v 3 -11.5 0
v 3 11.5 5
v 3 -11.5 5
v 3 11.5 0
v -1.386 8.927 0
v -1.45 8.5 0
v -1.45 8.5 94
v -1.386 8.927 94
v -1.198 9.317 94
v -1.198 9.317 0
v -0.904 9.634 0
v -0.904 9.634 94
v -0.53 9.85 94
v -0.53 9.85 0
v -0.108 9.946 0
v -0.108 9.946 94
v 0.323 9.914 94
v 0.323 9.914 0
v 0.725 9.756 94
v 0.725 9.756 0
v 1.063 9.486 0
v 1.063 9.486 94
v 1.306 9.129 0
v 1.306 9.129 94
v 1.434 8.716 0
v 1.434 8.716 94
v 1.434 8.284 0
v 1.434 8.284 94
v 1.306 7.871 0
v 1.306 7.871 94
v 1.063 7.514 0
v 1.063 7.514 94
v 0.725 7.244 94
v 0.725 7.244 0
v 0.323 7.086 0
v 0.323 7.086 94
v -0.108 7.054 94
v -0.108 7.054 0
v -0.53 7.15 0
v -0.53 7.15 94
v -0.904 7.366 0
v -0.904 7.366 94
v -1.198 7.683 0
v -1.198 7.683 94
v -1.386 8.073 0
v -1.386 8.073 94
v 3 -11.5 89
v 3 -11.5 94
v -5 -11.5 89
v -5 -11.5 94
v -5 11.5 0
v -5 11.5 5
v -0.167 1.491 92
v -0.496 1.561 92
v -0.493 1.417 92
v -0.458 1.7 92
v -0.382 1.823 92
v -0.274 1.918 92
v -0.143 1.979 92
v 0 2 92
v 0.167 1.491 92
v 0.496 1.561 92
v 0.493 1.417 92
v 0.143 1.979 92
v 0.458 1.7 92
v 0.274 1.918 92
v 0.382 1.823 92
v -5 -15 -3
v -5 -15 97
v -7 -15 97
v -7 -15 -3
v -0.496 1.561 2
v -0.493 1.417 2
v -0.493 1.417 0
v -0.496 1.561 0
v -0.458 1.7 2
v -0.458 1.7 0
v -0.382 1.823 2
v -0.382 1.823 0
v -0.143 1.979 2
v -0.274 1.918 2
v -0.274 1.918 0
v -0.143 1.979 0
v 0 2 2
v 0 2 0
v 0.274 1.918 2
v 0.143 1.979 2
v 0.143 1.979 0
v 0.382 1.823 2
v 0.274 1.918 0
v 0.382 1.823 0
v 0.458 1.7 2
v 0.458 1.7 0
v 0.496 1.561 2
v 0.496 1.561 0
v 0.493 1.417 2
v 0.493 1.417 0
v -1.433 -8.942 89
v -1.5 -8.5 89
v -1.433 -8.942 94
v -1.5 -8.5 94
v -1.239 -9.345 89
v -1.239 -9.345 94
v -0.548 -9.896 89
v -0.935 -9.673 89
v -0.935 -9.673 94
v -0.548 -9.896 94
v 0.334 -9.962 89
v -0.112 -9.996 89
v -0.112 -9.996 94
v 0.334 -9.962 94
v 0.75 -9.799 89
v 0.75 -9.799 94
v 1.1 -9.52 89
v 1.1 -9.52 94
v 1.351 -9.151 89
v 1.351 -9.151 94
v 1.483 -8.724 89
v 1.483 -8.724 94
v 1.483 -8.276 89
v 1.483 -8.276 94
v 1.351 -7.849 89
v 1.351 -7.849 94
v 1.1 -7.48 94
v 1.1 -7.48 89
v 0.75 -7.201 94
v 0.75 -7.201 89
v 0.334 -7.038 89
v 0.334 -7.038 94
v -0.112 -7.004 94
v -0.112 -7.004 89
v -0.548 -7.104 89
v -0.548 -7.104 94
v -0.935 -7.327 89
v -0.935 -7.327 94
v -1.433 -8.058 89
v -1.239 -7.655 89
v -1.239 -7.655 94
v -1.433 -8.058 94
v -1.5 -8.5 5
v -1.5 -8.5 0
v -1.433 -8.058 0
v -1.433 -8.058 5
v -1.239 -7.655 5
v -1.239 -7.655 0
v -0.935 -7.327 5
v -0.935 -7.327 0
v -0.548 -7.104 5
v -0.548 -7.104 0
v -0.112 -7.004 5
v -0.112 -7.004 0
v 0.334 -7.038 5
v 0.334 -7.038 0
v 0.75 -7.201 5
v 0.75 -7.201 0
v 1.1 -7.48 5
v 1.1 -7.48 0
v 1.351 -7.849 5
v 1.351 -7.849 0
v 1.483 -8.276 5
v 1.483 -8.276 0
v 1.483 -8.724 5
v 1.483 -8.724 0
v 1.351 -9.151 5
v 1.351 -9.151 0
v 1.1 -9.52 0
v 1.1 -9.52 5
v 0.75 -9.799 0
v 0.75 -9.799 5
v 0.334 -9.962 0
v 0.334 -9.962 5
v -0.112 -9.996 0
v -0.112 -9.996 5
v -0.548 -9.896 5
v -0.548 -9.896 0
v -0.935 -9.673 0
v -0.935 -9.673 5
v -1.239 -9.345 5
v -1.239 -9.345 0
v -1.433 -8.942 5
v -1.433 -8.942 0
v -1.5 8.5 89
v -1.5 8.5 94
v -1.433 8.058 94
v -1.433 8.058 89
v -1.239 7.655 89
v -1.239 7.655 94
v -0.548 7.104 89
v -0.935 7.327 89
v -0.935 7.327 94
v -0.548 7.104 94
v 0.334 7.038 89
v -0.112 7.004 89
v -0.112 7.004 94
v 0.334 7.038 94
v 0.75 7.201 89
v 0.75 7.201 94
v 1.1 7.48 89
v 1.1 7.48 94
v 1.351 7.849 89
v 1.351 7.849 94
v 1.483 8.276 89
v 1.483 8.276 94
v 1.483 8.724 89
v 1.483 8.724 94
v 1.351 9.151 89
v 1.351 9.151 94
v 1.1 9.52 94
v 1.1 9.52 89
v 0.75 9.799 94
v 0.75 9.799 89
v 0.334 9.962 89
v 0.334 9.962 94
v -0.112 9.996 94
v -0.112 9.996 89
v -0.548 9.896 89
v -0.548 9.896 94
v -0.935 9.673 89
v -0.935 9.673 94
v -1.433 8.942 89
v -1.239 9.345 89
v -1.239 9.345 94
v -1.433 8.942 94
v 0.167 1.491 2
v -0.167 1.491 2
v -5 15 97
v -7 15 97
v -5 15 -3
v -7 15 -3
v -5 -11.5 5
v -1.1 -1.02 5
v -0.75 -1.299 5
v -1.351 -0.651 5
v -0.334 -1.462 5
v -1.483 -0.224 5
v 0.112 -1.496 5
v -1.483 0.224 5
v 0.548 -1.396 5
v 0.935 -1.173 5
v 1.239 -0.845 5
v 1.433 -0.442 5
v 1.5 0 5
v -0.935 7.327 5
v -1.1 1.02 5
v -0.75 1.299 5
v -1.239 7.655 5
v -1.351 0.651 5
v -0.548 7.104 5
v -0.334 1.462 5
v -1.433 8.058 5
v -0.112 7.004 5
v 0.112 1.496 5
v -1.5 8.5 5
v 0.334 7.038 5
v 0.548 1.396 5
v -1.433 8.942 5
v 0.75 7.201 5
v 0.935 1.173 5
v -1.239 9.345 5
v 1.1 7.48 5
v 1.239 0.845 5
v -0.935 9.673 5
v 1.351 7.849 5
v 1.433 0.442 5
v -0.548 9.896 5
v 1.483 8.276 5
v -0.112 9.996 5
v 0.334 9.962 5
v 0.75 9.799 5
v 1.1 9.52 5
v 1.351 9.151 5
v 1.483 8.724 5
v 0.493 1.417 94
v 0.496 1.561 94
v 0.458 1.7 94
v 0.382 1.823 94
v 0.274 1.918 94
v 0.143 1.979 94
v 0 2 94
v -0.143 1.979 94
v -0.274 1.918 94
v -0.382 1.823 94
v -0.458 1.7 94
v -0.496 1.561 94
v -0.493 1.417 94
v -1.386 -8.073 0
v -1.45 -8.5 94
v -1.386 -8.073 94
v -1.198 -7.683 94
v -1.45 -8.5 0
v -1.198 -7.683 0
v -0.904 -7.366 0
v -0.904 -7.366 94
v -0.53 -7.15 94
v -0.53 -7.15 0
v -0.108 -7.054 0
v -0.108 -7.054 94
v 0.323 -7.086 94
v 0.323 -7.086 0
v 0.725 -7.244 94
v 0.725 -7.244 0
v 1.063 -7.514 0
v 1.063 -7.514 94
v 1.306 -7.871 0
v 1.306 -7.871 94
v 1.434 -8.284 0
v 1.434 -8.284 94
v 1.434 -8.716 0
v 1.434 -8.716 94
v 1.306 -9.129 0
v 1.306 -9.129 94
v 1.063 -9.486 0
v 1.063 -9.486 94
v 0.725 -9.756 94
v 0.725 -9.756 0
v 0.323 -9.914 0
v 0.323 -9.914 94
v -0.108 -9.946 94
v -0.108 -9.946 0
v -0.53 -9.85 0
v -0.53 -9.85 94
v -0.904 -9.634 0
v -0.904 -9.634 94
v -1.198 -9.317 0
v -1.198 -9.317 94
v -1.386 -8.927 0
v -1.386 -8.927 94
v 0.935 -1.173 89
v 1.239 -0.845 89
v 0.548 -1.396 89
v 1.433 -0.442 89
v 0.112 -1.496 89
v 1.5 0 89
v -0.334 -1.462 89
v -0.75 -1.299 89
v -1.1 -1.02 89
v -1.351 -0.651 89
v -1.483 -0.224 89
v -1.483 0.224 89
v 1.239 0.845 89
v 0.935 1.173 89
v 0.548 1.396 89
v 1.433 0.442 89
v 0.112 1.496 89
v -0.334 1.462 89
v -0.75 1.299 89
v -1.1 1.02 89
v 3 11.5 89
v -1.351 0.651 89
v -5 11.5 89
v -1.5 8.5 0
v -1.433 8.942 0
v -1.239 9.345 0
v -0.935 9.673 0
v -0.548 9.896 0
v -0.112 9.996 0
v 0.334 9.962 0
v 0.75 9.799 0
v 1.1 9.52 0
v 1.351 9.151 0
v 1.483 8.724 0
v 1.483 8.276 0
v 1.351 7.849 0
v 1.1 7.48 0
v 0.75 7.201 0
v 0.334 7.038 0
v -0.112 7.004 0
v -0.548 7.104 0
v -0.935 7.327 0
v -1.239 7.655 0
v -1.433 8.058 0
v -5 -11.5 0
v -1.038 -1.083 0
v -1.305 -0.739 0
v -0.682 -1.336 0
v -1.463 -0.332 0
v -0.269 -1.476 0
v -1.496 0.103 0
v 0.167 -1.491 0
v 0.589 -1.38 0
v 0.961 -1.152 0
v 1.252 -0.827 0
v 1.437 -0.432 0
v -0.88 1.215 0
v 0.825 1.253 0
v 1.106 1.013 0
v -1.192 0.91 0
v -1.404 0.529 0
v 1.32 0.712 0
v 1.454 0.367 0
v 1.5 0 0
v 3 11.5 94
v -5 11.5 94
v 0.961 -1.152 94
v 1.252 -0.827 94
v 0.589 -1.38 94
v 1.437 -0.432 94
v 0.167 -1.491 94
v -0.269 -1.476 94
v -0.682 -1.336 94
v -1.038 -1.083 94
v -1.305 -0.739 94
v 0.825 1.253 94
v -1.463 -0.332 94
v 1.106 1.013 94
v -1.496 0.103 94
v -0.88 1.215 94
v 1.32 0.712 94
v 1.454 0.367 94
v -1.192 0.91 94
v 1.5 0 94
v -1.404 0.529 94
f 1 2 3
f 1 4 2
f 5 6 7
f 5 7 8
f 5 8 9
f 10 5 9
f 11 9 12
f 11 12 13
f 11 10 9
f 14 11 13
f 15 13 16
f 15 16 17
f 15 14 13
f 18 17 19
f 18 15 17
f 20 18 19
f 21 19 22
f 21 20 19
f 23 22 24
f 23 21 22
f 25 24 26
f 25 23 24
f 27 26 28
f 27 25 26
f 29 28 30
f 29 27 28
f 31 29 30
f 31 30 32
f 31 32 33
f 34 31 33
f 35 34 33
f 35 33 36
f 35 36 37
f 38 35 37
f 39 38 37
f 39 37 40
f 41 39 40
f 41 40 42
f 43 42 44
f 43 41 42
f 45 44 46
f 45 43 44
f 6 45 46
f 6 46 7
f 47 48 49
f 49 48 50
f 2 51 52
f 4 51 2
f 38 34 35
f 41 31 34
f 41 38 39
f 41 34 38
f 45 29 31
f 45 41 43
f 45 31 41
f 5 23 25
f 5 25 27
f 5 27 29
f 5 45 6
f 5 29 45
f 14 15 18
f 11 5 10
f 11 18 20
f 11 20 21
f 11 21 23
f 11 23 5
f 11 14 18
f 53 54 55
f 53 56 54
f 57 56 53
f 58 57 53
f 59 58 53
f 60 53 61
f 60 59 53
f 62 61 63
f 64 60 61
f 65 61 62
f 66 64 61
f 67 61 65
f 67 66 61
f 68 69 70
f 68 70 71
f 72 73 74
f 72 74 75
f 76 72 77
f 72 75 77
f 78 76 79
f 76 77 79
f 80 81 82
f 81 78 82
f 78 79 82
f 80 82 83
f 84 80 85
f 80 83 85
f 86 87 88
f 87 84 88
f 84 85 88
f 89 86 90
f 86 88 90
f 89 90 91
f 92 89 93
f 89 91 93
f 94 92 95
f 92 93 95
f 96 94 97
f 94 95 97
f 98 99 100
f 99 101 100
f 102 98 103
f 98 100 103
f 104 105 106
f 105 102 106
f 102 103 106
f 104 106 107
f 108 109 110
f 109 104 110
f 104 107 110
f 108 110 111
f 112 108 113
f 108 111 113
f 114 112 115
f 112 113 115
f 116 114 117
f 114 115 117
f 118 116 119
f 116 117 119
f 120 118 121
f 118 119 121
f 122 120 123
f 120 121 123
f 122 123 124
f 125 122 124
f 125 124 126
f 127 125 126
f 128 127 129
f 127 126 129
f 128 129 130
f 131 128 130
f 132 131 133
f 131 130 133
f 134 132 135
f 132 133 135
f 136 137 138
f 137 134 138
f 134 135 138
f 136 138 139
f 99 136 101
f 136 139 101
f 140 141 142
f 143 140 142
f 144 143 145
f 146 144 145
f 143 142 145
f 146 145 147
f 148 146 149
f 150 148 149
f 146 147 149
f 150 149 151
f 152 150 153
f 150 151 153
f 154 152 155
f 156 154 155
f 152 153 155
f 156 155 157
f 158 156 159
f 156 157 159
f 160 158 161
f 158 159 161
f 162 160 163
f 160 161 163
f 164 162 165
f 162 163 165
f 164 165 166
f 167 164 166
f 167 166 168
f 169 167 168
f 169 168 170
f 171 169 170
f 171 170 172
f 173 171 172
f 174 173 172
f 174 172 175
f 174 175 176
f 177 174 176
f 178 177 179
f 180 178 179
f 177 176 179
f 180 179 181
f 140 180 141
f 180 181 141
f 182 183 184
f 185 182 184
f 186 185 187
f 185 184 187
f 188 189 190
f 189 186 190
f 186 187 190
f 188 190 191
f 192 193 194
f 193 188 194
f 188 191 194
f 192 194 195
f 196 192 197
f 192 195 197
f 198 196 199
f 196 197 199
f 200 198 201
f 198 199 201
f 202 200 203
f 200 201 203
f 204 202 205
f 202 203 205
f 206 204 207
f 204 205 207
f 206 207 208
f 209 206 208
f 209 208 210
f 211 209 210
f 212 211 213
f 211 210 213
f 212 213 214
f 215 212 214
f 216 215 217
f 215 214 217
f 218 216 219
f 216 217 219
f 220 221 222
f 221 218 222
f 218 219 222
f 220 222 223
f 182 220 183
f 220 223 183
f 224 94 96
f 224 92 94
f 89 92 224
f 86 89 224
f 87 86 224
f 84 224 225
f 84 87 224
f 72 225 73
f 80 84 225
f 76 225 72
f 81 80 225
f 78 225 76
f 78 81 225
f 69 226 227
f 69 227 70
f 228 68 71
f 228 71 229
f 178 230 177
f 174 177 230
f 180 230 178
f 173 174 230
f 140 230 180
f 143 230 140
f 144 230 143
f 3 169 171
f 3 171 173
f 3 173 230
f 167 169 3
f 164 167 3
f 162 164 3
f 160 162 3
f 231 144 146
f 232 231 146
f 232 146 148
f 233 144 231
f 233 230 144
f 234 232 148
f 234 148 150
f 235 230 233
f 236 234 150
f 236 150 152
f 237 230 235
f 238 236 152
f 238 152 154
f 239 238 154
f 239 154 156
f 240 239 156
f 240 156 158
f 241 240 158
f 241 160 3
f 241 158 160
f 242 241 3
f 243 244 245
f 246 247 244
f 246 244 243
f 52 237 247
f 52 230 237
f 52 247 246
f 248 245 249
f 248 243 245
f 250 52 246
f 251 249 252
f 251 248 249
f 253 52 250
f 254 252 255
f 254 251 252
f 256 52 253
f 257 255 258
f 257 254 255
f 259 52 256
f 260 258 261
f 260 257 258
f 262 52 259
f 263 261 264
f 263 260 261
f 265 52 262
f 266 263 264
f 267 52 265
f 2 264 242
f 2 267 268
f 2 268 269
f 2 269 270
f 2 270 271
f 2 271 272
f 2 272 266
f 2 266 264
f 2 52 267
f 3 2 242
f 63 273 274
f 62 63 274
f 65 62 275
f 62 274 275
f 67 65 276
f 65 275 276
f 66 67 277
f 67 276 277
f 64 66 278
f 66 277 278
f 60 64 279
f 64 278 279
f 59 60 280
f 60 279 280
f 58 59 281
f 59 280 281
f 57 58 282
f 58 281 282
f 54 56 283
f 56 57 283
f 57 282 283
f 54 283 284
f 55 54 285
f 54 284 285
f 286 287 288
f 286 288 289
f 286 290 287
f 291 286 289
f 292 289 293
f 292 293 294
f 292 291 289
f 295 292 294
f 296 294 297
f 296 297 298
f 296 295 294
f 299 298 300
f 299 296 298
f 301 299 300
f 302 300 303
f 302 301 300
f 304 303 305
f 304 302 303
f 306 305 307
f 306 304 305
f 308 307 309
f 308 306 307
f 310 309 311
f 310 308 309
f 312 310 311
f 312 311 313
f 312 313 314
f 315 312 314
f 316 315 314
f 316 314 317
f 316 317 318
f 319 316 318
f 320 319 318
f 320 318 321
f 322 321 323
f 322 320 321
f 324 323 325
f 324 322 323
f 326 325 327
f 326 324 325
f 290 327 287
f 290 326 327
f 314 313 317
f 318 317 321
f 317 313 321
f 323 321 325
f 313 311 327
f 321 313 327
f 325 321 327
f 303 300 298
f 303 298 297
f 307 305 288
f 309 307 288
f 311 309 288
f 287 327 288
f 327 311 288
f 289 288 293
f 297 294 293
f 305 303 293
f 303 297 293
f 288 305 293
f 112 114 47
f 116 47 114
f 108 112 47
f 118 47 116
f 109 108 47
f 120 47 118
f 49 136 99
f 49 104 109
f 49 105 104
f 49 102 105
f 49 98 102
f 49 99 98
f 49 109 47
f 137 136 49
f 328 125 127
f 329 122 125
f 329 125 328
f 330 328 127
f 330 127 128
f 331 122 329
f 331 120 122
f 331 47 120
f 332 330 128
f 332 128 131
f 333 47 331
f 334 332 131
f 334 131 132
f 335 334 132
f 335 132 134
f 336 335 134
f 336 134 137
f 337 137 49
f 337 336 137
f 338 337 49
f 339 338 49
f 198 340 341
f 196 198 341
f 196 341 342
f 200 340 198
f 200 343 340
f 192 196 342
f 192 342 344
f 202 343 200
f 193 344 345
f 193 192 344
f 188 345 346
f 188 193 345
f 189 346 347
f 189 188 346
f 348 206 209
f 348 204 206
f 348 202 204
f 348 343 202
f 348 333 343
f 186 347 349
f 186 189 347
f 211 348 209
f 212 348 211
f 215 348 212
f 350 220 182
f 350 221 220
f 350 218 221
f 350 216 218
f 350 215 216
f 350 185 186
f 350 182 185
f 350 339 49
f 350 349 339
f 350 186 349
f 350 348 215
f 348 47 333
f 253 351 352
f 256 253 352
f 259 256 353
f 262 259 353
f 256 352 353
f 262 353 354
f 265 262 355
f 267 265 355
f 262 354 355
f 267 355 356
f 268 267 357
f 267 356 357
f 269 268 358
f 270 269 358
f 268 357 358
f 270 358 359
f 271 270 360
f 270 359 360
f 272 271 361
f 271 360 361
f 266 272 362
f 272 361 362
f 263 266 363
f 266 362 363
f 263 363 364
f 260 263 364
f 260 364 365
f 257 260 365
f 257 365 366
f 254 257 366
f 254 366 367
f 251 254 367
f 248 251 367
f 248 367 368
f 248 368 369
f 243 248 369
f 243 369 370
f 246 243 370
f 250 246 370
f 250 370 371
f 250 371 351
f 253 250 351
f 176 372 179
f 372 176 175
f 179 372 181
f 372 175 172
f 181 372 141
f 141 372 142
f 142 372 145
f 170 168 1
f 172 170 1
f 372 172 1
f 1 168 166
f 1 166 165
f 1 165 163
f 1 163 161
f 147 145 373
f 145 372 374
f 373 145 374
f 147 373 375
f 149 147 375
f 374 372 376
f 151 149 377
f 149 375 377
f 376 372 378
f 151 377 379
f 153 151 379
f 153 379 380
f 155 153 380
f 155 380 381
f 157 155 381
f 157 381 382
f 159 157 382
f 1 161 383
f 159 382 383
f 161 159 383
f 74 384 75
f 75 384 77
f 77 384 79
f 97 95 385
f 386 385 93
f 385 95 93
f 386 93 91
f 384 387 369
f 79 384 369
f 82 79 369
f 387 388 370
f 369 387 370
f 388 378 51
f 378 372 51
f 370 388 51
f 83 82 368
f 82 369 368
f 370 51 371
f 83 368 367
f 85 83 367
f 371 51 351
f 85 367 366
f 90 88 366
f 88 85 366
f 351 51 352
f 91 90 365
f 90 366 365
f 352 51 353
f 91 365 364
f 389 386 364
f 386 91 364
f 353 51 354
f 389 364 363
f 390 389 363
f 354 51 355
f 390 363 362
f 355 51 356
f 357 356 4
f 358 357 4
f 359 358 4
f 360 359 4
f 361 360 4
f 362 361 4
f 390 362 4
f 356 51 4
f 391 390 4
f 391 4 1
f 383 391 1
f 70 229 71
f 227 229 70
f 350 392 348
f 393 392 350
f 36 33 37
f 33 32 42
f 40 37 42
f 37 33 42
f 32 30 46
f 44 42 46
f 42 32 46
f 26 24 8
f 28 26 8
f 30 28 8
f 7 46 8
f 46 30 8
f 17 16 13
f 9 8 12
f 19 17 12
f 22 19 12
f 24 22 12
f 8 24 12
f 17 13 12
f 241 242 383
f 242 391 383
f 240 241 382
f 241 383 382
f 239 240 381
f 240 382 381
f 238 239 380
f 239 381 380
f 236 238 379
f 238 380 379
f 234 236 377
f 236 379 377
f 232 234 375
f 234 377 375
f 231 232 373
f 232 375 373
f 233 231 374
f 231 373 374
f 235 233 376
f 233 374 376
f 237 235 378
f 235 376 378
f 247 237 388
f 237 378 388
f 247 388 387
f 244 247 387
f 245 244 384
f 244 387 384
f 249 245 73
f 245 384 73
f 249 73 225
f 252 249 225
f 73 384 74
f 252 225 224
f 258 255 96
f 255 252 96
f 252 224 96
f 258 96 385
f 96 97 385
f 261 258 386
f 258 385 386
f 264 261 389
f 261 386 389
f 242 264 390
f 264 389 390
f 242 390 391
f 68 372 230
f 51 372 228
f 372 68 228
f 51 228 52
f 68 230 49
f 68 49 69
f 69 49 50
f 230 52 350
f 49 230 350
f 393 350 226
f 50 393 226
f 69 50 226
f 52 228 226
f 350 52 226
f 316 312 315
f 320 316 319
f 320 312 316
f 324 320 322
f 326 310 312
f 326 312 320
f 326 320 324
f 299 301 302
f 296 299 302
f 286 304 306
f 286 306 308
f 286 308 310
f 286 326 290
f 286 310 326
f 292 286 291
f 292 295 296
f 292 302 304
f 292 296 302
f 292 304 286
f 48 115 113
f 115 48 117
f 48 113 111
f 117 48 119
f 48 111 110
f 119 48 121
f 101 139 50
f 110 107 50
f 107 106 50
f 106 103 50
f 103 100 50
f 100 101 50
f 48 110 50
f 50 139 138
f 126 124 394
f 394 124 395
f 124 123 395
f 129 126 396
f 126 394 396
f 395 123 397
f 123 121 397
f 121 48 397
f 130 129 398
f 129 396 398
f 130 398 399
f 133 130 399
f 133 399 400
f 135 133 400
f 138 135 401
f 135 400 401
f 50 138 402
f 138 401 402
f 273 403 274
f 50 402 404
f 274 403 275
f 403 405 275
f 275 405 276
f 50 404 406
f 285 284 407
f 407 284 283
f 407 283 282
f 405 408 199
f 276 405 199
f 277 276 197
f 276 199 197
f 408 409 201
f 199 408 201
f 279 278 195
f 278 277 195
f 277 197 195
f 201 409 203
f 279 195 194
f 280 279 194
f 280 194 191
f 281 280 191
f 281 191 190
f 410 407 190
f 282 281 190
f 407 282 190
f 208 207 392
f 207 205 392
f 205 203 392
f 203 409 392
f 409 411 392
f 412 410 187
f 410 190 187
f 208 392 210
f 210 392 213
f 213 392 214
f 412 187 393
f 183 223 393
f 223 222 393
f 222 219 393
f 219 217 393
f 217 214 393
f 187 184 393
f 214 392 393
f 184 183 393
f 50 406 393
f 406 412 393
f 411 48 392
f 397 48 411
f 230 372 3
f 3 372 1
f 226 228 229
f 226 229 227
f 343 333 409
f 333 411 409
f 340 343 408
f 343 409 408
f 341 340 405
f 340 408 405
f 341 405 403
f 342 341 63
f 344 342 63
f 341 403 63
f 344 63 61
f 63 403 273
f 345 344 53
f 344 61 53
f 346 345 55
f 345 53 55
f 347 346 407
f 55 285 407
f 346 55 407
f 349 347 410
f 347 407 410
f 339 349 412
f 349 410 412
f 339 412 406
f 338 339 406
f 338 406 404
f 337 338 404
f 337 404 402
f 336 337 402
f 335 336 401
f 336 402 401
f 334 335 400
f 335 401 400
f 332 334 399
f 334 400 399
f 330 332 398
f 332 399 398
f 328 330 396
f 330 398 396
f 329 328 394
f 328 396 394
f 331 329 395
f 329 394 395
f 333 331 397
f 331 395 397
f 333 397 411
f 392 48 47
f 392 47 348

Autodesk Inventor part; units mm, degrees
ref_plane "YZ Plane" through (0, 0, 0) normal (1, 0, 0) x (0, 1, 0)
ref_plane "XZ Plane" through (0, 0, 0) normal (0, 1, 0) x (-1, 0, 0)
sketch "Sketch1" plane through (0, 0, 0) normal (0, 0, 1) x (1, 0, 0)
  circle A0 centre (0, 0) radius 1.5
  line L0 (3, 3) -> (3, -3)
  line L1 (3, -3) -> (-3, -3)
  line L2 (-3, -3) -> (-3, 3)
  line L3 (-3, 3) -> (3, 3)
  dimension "d0" = 3
  dimension "d1" = 6
extrude "Extrusion1" add sketch "Sketch1" along normal blind 5
sketch "Sketch13" plane through (0, 0, 0) normal (0, 0, -1) x (-1, 0, 0)
  circle A0 centre (0, 0) radius 1.5 projected
  line L0 (3, 3) -> (-3, 3) projected
  line L1 (0, 0) -> (0, 1.5)
  circle A1 centre (0, 1.5) radius 0.5
  dimension "d63" = 1
extrude "Extrusion11" cut sketch "Sketch13" against normal blind 2 contours A1 L1 A0 | A0 A1 | A0 L1 A1 picked at (-0.1081, 1.6551)
thread "Thread2" size "M1x0.25" class "6H" standard "ANSI Metric M Profile" full length
ref_plane "Work Plane3" through (0, 0, 47) normal (0, 0, 1) x (1, 0, 0)
sketch "Sketch15" plane through (0, 0, 0) normal (0, 0, -1) x (-1, 0, 0)
  line L0 (-3, 3) -> (-3, -3) projected
  line L1 (3, -3) -> (3, 3) projected
  line L2 (3, 3) -> (-3, 3) projected
  arc A0 (-0.493, 1.4167) -> (0.493, 1.4167) centre (0, 0) ccw projected
  line L3 (0, 0) -> (0, 3) construction
  line L4 (0, 0) -> (0, 8.5) construction
  circle A1 centre (0, 8.5) radius 1.5
  line L5 (-3, 3) -> (3, 3)
  line L6 (3, 3) -> (3, 11.5)
  line L7 (3, 11.5) -> (-3, 11.5)
  line L8 (-3, 11.5) -> (-3, 3)
  line L9 (-3, 0) -> (3, 0) construction
  line L10 (3, -3) -> (-3, -3)
  circle A2 centre (0, -8.5) radius 1.5
  line L11 (-3, -3) -> (3, -3)
  line L12 (3, -3) -> (3, -11.5)
  line L13 (3, -11.5) -> (-3, -11.5)
  line L14 (-3, -11.5) -> (-3, -3)
  point P0 (0, -3)
  dimension "d76" = 3
  dimension "d77" = 8.5
  dimension "d78" = 3
extrude "Extrusion13" add sketch "Sketch15" against normal up to surface (5 mm away) contours L8 L7 L6 L2 | L10 L12 L13 L14
mirror "Mirror2" about plane through (0, 0, 47) normal (0, 0, 1) of "Extrusion1", "Extrusion11", "Extrusion13"
sketch "Sketch16" plane through (0, 0, 0) normal (0, 0, -1) x (-1, 0, 0)
  circle A0 centre (0, 8.5) radius 1.5 projected
  circle A1 centre (0, -8.5) radius 1.5 projected
  circle A2 centre (0, 8.5) radius 1.45
  circle A3 centre (0, -8.5) radius 1.45
  dimension "d81" = 0.05
extrude "Extrusion14" add sketch "Sketch16" against normal up to surface (94 mm away) contours A2 | A3
sketch "Sketch17" plane through (-3, -11.5, 5) normal (-1, 0, 0) x (0, 0, 1)
  line L0 (0, 0) -> (0, 23) projected
  line L1 (-5, 23) -> (0, 23) projected
  line L2 (-5, 0) -> (-5, 23) projected
  line L3 (-5, 0) -> (0, 0) projected
  line L4 (84, 0) -> (84, 23) projected
  line L5 (89, 0) -> (84, 0) projected
  line L6 (89, 0) -> (89, 23) projected
  line L7 (89, 23) -> (84, 23) projected
extrude "Extrusion15" add sketch "Sketch17" along normal blind 2
sketch "Sketch18" plane through (-5, -11.5, 5) normal (-1, 0, 0) x (0, 0, 1)
  line L0 (84, 23) -> (89, 23) projected
  line L1 (84, 0) -> (84, 23) projected
  line L2 (89, 0) -> (84, 0) projected
  line L3 (89, 23) -> (89, 0) projected
  line L4 (-8, 26.5) -> (92, 26.5)
  line L5 (92, 26.5) -> (92, -3.5)
  line L6 (92, -3.5) -> (-8, -3.5)
  line L7 (-8, -3.5) -> (-8, 26.5)
  line L8 (89, 23) -> (89, 26.5) construction
  line L9 (89, 0) -> (89, -3.5) construction
  line L10 (89, 0) -> (92, 0) construction
  line L11 (-5, 0) -> (-8, 0) construction
  dimension "d86" = 30
  dimension "d87" = 100
extrude "Extrusion16" add sketch "Sketch18" along normal blind 2 contours L0 L3 L2 L1 | L4 L5 L6 L7
properties part number "Bearing2"
